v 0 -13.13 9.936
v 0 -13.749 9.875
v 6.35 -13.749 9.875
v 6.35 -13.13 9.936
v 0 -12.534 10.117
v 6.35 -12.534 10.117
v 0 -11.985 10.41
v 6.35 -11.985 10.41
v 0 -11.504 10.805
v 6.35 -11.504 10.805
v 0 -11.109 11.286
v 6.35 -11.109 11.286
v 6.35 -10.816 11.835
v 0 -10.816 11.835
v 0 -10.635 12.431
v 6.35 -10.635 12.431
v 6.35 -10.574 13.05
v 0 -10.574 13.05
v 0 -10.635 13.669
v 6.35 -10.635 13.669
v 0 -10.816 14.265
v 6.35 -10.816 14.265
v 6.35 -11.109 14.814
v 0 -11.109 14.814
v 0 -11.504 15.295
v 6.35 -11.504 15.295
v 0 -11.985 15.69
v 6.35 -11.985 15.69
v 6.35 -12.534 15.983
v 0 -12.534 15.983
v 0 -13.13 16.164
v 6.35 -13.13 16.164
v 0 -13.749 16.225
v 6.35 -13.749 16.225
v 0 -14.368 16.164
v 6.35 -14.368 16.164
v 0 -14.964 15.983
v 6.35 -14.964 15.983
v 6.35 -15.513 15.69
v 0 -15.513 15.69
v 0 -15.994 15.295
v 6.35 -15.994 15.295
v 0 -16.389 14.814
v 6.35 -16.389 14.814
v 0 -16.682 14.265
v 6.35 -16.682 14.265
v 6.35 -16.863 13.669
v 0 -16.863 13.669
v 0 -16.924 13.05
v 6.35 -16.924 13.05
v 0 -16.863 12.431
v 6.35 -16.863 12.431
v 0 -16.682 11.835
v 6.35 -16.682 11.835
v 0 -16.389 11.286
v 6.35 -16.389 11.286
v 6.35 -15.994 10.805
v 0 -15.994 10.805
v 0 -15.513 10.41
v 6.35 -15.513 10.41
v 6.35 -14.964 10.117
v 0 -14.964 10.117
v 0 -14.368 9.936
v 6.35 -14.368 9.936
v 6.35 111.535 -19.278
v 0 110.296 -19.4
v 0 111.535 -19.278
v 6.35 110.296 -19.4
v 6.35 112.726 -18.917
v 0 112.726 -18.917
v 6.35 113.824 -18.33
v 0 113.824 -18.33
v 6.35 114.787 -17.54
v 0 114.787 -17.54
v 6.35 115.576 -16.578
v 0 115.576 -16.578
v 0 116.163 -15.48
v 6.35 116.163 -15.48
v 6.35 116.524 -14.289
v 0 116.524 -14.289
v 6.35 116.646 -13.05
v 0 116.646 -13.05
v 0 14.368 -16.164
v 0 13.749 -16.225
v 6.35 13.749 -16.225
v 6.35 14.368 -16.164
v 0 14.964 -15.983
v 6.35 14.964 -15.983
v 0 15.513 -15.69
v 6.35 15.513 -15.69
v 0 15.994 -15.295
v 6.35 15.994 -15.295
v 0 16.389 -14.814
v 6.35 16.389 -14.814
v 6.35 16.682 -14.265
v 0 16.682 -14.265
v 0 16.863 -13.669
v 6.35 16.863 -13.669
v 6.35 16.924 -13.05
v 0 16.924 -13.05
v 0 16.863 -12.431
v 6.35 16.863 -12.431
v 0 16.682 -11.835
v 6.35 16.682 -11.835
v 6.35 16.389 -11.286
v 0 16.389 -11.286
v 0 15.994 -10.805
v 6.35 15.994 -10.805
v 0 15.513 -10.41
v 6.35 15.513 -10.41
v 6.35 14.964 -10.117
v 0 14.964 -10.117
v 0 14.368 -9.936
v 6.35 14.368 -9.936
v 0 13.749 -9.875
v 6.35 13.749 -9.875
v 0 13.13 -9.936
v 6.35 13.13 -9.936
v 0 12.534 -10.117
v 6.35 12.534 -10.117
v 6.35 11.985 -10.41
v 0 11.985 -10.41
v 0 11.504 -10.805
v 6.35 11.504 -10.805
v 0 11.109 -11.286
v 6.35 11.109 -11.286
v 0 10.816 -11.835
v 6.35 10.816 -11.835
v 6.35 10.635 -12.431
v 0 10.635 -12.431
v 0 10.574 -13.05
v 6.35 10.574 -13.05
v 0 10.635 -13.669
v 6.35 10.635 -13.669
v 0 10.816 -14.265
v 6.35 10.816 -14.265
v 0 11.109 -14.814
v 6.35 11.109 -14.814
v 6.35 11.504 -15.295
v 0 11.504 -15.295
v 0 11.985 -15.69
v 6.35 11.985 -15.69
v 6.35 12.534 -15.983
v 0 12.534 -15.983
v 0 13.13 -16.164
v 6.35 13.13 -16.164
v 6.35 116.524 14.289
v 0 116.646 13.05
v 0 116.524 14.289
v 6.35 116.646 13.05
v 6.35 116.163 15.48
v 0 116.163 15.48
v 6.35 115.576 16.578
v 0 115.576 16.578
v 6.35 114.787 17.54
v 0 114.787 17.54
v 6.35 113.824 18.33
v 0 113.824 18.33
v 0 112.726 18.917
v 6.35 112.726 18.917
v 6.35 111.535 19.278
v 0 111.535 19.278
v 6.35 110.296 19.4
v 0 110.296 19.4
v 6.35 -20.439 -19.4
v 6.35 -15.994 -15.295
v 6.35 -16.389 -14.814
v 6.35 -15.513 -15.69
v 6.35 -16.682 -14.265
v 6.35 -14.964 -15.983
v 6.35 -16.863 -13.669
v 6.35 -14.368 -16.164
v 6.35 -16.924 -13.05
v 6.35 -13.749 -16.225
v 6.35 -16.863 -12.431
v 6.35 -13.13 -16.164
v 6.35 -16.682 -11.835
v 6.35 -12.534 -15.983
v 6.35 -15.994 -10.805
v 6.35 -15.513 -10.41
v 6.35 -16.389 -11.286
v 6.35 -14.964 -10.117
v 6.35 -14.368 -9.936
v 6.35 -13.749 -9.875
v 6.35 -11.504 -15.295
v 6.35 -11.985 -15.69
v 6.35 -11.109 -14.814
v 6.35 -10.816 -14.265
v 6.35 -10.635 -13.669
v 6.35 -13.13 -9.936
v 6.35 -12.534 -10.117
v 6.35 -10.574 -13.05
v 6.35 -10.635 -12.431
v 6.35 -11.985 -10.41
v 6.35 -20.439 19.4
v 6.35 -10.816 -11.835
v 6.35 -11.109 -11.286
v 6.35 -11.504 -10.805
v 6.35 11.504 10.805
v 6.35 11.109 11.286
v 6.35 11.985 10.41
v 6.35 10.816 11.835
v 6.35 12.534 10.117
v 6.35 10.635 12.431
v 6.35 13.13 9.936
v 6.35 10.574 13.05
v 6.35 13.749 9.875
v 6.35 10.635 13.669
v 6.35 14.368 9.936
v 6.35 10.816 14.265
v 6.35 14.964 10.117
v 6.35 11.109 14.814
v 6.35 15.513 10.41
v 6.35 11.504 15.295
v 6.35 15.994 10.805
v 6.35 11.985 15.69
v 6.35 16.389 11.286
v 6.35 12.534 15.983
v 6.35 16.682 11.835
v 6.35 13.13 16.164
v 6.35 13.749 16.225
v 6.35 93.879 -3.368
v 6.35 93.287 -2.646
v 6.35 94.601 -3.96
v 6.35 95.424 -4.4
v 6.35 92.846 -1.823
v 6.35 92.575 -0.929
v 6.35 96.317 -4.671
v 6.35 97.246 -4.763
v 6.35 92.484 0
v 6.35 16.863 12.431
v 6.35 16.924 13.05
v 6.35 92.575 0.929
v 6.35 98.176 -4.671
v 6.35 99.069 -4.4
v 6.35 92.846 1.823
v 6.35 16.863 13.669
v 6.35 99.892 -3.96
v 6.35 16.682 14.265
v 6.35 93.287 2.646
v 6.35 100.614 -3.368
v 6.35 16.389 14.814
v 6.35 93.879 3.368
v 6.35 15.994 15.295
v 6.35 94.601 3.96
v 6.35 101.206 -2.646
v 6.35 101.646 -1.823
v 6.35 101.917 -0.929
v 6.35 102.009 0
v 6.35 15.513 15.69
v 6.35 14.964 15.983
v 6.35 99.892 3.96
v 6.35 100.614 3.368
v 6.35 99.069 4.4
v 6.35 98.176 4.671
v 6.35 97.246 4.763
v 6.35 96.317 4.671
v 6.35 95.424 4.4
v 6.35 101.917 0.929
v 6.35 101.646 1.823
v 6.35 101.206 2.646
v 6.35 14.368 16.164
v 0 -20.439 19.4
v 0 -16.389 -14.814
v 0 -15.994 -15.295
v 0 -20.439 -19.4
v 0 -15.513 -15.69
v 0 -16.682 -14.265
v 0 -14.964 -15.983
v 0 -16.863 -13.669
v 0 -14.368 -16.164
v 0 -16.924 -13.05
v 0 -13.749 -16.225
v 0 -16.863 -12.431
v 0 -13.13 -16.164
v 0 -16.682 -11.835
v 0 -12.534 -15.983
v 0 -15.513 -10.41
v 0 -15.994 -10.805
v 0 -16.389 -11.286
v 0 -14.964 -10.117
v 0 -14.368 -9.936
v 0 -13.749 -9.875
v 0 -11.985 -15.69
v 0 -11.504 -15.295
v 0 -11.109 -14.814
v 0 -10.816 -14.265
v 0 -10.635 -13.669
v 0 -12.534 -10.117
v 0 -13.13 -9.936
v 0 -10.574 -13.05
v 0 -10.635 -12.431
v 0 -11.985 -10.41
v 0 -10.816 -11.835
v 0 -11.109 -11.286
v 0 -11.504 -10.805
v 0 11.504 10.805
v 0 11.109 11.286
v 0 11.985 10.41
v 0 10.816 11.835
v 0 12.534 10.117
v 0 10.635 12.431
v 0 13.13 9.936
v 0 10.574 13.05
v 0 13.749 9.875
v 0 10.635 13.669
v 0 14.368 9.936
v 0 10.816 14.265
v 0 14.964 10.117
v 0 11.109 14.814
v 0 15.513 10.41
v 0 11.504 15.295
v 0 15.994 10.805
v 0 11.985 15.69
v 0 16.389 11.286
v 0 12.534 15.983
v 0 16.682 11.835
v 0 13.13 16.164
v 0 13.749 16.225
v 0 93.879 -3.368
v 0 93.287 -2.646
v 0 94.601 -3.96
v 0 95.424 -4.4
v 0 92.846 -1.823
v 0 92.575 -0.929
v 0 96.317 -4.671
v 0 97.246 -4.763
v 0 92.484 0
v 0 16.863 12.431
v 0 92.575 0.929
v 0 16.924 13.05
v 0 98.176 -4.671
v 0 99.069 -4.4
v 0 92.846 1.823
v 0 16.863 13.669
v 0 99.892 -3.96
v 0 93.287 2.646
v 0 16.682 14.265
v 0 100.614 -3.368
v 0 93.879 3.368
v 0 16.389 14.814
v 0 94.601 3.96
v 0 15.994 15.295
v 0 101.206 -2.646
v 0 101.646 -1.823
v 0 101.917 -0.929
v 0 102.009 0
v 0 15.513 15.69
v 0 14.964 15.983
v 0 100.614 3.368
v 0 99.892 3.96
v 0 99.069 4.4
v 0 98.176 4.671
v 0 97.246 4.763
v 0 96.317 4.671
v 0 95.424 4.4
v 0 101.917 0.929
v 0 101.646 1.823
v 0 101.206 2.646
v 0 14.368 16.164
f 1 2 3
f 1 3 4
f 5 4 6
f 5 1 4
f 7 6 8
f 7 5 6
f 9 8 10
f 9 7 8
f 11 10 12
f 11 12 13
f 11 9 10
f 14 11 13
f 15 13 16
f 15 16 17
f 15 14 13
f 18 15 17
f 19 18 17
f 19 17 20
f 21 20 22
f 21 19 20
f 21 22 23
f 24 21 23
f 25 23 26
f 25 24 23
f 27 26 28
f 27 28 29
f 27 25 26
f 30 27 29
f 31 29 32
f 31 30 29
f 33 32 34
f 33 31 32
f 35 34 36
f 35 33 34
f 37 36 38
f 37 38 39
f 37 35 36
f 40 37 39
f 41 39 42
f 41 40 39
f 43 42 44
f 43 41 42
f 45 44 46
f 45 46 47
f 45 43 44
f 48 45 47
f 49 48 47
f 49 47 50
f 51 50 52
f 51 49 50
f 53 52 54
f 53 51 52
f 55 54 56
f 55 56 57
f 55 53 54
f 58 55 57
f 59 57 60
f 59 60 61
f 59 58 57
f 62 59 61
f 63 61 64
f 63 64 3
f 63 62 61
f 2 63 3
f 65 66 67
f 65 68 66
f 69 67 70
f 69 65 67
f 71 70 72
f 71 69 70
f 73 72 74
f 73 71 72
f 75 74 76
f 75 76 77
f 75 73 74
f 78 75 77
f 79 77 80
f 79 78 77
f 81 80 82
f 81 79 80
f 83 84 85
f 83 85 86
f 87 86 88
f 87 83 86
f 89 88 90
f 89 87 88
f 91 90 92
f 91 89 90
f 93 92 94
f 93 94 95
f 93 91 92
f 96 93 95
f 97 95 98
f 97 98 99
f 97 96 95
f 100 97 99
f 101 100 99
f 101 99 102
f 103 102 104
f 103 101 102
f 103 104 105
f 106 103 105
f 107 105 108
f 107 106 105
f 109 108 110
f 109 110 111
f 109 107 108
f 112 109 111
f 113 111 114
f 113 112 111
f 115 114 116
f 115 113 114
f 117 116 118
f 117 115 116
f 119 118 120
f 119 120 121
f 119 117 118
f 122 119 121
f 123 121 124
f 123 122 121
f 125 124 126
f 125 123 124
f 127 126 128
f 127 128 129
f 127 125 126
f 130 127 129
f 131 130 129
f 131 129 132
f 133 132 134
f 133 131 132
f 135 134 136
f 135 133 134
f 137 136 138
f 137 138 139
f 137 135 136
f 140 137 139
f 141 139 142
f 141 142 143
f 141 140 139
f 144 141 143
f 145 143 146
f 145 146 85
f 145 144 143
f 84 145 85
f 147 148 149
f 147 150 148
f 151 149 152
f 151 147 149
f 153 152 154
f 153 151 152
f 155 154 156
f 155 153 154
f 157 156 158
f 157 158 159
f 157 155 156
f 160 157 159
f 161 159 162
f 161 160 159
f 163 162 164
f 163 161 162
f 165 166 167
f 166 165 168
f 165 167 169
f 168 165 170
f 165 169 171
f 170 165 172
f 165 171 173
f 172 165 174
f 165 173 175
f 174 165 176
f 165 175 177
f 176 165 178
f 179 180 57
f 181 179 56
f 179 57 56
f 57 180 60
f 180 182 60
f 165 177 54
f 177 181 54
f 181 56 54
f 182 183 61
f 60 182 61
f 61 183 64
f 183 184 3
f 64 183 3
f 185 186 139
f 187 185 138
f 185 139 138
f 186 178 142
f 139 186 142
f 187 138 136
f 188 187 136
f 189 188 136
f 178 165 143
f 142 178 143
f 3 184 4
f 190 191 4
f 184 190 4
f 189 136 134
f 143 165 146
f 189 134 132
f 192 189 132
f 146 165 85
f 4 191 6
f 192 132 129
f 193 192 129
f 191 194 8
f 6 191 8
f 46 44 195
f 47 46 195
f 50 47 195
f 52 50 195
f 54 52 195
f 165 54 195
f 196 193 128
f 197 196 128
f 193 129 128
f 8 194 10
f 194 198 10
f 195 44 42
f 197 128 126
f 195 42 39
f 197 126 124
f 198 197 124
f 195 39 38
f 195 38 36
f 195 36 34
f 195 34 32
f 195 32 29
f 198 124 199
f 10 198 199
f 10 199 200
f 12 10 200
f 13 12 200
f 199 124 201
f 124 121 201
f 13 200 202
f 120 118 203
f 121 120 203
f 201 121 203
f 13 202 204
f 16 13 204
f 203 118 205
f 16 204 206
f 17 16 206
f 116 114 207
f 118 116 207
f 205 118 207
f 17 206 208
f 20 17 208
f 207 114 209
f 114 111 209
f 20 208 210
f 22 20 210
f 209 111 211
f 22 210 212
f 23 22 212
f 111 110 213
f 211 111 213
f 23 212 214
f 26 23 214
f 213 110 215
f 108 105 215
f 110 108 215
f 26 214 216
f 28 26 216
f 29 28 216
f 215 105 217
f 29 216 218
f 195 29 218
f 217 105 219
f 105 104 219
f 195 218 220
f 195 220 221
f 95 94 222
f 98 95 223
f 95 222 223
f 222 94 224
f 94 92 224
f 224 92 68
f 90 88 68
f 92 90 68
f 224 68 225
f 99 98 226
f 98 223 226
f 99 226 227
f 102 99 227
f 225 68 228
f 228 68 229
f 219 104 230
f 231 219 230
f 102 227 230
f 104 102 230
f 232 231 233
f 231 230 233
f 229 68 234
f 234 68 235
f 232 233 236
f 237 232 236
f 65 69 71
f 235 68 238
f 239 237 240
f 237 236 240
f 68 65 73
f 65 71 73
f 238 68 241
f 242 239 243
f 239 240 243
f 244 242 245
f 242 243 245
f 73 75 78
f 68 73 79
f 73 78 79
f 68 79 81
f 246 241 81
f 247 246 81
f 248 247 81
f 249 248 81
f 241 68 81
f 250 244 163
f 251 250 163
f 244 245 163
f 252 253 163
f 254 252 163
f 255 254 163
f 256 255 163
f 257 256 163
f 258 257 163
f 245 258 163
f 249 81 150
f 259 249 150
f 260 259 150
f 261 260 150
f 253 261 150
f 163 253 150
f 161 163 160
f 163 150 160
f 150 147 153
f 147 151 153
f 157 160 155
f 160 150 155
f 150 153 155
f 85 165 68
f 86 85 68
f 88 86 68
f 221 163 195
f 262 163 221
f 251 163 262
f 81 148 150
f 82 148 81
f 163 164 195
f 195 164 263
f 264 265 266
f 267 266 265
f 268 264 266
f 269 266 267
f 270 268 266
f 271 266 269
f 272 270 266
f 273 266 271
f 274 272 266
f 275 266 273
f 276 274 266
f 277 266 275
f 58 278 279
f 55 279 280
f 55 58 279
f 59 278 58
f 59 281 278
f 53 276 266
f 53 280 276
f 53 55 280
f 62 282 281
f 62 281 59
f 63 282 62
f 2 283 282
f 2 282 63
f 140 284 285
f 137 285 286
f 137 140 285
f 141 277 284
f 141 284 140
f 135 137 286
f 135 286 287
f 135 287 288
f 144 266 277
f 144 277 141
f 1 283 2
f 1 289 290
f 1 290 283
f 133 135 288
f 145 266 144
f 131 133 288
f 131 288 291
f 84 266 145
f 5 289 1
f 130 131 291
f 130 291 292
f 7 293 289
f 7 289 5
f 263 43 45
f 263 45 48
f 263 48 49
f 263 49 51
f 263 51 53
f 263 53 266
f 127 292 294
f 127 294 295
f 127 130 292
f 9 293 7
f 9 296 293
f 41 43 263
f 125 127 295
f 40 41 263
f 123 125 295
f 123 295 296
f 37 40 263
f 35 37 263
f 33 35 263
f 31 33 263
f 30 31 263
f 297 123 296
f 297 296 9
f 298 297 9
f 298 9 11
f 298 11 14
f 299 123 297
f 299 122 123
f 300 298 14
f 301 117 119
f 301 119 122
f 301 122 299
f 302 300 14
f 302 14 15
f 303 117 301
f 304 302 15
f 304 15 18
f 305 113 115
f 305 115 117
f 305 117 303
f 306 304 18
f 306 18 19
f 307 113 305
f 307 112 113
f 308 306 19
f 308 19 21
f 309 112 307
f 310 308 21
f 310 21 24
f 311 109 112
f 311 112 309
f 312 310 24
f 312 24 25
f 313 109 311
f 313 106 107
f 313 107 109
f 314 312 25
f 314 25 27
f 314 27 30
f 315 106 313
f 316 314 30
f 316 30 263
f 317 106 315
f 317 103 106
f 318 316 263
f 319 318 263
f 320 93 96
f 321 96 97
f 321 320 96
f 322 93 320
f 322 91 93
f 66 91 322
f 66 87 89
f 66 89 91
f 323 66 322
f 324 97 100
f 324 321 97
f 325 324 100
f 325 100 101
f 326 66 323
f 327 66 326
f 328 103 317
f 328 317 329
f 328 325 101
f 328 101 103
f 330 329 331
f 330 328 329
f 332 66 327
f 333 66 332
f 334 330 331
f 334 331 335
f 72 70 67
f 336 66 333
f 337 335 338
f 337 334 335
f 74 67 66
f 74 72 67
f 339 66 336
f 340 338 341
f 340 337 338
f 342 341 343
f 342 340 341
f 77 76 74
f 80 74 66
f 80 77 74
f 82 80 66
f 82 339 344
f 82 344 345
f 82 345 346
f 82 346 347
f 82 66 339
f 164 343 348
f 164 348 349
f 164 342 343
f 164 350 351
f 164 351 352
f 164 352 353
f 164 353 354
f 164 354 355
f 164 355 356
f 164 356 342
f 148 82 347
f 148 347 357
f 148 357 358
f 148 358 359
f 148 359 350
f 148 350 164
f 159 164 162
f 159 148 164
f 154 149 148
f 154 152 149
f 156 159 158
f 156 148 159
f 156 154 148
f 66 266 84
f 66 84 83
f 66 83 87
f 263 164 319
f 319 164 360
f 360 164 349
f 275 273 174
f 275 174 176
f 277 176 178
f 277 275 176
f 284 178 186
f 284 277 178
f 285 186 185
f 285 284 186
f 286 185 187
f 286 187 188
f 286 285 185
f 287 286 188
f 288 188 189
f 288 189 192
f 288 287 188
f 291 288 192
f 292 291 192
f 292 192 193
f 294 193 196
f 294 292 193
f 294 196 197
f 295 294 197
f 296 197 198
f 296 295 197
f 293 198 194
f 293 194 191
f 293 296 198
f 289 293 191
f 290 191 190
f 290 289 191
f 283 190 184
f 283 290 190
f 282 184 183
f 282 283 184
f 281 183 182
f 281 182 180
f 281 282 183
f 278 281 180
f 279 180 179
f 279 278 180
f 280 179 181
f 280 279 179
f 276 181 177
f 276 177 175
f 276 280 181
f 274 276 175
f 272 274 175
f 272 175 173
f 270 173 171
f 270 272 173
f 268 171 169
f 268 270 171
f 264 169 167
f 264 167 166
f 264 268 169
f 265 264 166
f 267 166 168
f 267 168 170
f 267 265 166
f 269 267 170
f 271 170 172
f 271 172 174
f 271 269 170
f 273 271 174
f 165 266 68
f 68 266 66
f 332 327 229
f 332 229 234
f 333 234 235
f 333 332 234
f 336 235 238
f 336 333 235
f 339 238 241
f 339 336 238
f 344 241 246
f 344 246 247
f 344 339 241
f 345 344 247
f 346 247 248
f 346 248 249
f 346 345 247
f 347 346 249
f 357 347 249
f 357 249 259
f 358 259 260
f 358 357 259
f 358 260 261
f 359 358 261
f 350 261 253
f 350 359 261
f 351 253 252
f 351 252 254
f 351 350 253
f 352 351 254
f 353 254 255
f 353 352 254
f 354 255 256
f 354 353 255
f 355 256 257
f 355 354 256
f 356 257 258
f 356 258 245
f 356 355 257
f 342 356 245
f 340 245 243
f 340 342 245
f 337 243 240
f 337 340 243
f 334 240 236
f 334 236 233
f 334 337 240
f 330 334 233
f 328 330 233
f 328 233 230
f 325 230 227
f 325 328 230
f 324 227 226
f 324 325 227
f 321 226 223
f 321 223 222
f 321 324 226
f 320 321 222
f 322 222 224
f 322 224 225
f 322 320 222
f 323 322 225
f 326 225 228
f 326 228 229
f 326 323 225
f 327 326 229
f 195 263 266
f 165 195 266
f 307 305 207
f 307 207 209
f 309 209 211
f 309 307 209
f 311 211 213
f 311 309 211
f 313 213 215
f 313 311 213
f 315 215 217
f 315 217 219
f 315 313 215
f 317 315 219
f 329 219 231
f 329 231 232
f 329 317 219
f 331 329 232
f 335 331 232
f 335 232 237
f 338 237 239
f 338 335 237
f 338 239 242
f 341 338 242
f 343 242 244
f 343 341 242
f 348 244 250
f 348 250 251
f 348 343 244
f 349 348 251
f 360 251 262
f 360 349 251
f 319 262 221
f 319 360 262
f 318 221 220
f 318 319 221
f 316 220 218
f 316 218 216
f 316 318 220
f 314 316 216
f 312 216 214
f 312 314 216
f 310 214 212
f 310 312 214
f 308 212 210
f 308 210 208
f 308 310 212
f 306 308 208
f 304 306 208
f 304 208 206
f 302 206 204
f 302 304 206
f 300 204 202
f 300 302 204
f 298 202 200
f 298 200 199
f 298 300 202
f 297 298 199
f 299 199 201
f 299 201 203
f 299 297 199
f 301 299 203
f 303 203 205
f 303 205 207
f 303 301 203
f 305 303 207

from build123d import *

# Parameters (mm, degrees)
SKETCH1_R           = 4.762500002
SKETCH1_W           = 38.8
SKETCH1_H           = 40.878125
SKETCH1_R_2         = 3.175
BOSS_EXTRUDE1_DEPTH = 6.35
FILLET1_R           = 6.35


with BuildPart() as part:
    # Sketch1 → Boss-Extrude1 (new body)
    with BuildSketch(Plane(origin=(0, 0, 0), x_dir=(0, 0, -1), z_dir=(1, 0, 0))):
        Polygon((19.4, 20.4390625), (-19.4, 20.4390625), (-19.4, 77.846455089), (-19.4, 116.646455089), (19.4, 116.646455089), (19.4, 77.846455095), align=None)
        with Locations((0, 97.246455089)):
            Circle(SKETCH1_R, mode=Mode.SUBTRACT)
        Rectangle(SKETCH1_W, SKETCH1_H)
        with Locations((13.05, -13.748956991)):
            Circle(SKETCH1_R_2, mode=Mode.SUBTRACT)
        with Locations((-13.05, -13.748956991)):
            Circle(SKETCH1_R_2, mode=Mode.SUBTRACT)
        with Locations((13.05, 13.748956991)):
            Circle(SKETCH1_R_2, mode=Mode.SUBTRACT)
        with Locations((-13.05, 13.748956991)):
            Circle(SKETCH1_R_2, mode=Mode.SUBTRACT)
    extrude(amount=BOSS_EXTRUDE1_DEPTH)

    # Fillet1
    fillet1_edges = [part.edges().sort_by_distance(p)[0] for p in [
        (3.175, 116.646455089, 19.4),
        (3.175, 116.646455089, -19.4),
    ]]
    fillet(fillet1_edges, radius=FILLET1_R)


solid = part.part
